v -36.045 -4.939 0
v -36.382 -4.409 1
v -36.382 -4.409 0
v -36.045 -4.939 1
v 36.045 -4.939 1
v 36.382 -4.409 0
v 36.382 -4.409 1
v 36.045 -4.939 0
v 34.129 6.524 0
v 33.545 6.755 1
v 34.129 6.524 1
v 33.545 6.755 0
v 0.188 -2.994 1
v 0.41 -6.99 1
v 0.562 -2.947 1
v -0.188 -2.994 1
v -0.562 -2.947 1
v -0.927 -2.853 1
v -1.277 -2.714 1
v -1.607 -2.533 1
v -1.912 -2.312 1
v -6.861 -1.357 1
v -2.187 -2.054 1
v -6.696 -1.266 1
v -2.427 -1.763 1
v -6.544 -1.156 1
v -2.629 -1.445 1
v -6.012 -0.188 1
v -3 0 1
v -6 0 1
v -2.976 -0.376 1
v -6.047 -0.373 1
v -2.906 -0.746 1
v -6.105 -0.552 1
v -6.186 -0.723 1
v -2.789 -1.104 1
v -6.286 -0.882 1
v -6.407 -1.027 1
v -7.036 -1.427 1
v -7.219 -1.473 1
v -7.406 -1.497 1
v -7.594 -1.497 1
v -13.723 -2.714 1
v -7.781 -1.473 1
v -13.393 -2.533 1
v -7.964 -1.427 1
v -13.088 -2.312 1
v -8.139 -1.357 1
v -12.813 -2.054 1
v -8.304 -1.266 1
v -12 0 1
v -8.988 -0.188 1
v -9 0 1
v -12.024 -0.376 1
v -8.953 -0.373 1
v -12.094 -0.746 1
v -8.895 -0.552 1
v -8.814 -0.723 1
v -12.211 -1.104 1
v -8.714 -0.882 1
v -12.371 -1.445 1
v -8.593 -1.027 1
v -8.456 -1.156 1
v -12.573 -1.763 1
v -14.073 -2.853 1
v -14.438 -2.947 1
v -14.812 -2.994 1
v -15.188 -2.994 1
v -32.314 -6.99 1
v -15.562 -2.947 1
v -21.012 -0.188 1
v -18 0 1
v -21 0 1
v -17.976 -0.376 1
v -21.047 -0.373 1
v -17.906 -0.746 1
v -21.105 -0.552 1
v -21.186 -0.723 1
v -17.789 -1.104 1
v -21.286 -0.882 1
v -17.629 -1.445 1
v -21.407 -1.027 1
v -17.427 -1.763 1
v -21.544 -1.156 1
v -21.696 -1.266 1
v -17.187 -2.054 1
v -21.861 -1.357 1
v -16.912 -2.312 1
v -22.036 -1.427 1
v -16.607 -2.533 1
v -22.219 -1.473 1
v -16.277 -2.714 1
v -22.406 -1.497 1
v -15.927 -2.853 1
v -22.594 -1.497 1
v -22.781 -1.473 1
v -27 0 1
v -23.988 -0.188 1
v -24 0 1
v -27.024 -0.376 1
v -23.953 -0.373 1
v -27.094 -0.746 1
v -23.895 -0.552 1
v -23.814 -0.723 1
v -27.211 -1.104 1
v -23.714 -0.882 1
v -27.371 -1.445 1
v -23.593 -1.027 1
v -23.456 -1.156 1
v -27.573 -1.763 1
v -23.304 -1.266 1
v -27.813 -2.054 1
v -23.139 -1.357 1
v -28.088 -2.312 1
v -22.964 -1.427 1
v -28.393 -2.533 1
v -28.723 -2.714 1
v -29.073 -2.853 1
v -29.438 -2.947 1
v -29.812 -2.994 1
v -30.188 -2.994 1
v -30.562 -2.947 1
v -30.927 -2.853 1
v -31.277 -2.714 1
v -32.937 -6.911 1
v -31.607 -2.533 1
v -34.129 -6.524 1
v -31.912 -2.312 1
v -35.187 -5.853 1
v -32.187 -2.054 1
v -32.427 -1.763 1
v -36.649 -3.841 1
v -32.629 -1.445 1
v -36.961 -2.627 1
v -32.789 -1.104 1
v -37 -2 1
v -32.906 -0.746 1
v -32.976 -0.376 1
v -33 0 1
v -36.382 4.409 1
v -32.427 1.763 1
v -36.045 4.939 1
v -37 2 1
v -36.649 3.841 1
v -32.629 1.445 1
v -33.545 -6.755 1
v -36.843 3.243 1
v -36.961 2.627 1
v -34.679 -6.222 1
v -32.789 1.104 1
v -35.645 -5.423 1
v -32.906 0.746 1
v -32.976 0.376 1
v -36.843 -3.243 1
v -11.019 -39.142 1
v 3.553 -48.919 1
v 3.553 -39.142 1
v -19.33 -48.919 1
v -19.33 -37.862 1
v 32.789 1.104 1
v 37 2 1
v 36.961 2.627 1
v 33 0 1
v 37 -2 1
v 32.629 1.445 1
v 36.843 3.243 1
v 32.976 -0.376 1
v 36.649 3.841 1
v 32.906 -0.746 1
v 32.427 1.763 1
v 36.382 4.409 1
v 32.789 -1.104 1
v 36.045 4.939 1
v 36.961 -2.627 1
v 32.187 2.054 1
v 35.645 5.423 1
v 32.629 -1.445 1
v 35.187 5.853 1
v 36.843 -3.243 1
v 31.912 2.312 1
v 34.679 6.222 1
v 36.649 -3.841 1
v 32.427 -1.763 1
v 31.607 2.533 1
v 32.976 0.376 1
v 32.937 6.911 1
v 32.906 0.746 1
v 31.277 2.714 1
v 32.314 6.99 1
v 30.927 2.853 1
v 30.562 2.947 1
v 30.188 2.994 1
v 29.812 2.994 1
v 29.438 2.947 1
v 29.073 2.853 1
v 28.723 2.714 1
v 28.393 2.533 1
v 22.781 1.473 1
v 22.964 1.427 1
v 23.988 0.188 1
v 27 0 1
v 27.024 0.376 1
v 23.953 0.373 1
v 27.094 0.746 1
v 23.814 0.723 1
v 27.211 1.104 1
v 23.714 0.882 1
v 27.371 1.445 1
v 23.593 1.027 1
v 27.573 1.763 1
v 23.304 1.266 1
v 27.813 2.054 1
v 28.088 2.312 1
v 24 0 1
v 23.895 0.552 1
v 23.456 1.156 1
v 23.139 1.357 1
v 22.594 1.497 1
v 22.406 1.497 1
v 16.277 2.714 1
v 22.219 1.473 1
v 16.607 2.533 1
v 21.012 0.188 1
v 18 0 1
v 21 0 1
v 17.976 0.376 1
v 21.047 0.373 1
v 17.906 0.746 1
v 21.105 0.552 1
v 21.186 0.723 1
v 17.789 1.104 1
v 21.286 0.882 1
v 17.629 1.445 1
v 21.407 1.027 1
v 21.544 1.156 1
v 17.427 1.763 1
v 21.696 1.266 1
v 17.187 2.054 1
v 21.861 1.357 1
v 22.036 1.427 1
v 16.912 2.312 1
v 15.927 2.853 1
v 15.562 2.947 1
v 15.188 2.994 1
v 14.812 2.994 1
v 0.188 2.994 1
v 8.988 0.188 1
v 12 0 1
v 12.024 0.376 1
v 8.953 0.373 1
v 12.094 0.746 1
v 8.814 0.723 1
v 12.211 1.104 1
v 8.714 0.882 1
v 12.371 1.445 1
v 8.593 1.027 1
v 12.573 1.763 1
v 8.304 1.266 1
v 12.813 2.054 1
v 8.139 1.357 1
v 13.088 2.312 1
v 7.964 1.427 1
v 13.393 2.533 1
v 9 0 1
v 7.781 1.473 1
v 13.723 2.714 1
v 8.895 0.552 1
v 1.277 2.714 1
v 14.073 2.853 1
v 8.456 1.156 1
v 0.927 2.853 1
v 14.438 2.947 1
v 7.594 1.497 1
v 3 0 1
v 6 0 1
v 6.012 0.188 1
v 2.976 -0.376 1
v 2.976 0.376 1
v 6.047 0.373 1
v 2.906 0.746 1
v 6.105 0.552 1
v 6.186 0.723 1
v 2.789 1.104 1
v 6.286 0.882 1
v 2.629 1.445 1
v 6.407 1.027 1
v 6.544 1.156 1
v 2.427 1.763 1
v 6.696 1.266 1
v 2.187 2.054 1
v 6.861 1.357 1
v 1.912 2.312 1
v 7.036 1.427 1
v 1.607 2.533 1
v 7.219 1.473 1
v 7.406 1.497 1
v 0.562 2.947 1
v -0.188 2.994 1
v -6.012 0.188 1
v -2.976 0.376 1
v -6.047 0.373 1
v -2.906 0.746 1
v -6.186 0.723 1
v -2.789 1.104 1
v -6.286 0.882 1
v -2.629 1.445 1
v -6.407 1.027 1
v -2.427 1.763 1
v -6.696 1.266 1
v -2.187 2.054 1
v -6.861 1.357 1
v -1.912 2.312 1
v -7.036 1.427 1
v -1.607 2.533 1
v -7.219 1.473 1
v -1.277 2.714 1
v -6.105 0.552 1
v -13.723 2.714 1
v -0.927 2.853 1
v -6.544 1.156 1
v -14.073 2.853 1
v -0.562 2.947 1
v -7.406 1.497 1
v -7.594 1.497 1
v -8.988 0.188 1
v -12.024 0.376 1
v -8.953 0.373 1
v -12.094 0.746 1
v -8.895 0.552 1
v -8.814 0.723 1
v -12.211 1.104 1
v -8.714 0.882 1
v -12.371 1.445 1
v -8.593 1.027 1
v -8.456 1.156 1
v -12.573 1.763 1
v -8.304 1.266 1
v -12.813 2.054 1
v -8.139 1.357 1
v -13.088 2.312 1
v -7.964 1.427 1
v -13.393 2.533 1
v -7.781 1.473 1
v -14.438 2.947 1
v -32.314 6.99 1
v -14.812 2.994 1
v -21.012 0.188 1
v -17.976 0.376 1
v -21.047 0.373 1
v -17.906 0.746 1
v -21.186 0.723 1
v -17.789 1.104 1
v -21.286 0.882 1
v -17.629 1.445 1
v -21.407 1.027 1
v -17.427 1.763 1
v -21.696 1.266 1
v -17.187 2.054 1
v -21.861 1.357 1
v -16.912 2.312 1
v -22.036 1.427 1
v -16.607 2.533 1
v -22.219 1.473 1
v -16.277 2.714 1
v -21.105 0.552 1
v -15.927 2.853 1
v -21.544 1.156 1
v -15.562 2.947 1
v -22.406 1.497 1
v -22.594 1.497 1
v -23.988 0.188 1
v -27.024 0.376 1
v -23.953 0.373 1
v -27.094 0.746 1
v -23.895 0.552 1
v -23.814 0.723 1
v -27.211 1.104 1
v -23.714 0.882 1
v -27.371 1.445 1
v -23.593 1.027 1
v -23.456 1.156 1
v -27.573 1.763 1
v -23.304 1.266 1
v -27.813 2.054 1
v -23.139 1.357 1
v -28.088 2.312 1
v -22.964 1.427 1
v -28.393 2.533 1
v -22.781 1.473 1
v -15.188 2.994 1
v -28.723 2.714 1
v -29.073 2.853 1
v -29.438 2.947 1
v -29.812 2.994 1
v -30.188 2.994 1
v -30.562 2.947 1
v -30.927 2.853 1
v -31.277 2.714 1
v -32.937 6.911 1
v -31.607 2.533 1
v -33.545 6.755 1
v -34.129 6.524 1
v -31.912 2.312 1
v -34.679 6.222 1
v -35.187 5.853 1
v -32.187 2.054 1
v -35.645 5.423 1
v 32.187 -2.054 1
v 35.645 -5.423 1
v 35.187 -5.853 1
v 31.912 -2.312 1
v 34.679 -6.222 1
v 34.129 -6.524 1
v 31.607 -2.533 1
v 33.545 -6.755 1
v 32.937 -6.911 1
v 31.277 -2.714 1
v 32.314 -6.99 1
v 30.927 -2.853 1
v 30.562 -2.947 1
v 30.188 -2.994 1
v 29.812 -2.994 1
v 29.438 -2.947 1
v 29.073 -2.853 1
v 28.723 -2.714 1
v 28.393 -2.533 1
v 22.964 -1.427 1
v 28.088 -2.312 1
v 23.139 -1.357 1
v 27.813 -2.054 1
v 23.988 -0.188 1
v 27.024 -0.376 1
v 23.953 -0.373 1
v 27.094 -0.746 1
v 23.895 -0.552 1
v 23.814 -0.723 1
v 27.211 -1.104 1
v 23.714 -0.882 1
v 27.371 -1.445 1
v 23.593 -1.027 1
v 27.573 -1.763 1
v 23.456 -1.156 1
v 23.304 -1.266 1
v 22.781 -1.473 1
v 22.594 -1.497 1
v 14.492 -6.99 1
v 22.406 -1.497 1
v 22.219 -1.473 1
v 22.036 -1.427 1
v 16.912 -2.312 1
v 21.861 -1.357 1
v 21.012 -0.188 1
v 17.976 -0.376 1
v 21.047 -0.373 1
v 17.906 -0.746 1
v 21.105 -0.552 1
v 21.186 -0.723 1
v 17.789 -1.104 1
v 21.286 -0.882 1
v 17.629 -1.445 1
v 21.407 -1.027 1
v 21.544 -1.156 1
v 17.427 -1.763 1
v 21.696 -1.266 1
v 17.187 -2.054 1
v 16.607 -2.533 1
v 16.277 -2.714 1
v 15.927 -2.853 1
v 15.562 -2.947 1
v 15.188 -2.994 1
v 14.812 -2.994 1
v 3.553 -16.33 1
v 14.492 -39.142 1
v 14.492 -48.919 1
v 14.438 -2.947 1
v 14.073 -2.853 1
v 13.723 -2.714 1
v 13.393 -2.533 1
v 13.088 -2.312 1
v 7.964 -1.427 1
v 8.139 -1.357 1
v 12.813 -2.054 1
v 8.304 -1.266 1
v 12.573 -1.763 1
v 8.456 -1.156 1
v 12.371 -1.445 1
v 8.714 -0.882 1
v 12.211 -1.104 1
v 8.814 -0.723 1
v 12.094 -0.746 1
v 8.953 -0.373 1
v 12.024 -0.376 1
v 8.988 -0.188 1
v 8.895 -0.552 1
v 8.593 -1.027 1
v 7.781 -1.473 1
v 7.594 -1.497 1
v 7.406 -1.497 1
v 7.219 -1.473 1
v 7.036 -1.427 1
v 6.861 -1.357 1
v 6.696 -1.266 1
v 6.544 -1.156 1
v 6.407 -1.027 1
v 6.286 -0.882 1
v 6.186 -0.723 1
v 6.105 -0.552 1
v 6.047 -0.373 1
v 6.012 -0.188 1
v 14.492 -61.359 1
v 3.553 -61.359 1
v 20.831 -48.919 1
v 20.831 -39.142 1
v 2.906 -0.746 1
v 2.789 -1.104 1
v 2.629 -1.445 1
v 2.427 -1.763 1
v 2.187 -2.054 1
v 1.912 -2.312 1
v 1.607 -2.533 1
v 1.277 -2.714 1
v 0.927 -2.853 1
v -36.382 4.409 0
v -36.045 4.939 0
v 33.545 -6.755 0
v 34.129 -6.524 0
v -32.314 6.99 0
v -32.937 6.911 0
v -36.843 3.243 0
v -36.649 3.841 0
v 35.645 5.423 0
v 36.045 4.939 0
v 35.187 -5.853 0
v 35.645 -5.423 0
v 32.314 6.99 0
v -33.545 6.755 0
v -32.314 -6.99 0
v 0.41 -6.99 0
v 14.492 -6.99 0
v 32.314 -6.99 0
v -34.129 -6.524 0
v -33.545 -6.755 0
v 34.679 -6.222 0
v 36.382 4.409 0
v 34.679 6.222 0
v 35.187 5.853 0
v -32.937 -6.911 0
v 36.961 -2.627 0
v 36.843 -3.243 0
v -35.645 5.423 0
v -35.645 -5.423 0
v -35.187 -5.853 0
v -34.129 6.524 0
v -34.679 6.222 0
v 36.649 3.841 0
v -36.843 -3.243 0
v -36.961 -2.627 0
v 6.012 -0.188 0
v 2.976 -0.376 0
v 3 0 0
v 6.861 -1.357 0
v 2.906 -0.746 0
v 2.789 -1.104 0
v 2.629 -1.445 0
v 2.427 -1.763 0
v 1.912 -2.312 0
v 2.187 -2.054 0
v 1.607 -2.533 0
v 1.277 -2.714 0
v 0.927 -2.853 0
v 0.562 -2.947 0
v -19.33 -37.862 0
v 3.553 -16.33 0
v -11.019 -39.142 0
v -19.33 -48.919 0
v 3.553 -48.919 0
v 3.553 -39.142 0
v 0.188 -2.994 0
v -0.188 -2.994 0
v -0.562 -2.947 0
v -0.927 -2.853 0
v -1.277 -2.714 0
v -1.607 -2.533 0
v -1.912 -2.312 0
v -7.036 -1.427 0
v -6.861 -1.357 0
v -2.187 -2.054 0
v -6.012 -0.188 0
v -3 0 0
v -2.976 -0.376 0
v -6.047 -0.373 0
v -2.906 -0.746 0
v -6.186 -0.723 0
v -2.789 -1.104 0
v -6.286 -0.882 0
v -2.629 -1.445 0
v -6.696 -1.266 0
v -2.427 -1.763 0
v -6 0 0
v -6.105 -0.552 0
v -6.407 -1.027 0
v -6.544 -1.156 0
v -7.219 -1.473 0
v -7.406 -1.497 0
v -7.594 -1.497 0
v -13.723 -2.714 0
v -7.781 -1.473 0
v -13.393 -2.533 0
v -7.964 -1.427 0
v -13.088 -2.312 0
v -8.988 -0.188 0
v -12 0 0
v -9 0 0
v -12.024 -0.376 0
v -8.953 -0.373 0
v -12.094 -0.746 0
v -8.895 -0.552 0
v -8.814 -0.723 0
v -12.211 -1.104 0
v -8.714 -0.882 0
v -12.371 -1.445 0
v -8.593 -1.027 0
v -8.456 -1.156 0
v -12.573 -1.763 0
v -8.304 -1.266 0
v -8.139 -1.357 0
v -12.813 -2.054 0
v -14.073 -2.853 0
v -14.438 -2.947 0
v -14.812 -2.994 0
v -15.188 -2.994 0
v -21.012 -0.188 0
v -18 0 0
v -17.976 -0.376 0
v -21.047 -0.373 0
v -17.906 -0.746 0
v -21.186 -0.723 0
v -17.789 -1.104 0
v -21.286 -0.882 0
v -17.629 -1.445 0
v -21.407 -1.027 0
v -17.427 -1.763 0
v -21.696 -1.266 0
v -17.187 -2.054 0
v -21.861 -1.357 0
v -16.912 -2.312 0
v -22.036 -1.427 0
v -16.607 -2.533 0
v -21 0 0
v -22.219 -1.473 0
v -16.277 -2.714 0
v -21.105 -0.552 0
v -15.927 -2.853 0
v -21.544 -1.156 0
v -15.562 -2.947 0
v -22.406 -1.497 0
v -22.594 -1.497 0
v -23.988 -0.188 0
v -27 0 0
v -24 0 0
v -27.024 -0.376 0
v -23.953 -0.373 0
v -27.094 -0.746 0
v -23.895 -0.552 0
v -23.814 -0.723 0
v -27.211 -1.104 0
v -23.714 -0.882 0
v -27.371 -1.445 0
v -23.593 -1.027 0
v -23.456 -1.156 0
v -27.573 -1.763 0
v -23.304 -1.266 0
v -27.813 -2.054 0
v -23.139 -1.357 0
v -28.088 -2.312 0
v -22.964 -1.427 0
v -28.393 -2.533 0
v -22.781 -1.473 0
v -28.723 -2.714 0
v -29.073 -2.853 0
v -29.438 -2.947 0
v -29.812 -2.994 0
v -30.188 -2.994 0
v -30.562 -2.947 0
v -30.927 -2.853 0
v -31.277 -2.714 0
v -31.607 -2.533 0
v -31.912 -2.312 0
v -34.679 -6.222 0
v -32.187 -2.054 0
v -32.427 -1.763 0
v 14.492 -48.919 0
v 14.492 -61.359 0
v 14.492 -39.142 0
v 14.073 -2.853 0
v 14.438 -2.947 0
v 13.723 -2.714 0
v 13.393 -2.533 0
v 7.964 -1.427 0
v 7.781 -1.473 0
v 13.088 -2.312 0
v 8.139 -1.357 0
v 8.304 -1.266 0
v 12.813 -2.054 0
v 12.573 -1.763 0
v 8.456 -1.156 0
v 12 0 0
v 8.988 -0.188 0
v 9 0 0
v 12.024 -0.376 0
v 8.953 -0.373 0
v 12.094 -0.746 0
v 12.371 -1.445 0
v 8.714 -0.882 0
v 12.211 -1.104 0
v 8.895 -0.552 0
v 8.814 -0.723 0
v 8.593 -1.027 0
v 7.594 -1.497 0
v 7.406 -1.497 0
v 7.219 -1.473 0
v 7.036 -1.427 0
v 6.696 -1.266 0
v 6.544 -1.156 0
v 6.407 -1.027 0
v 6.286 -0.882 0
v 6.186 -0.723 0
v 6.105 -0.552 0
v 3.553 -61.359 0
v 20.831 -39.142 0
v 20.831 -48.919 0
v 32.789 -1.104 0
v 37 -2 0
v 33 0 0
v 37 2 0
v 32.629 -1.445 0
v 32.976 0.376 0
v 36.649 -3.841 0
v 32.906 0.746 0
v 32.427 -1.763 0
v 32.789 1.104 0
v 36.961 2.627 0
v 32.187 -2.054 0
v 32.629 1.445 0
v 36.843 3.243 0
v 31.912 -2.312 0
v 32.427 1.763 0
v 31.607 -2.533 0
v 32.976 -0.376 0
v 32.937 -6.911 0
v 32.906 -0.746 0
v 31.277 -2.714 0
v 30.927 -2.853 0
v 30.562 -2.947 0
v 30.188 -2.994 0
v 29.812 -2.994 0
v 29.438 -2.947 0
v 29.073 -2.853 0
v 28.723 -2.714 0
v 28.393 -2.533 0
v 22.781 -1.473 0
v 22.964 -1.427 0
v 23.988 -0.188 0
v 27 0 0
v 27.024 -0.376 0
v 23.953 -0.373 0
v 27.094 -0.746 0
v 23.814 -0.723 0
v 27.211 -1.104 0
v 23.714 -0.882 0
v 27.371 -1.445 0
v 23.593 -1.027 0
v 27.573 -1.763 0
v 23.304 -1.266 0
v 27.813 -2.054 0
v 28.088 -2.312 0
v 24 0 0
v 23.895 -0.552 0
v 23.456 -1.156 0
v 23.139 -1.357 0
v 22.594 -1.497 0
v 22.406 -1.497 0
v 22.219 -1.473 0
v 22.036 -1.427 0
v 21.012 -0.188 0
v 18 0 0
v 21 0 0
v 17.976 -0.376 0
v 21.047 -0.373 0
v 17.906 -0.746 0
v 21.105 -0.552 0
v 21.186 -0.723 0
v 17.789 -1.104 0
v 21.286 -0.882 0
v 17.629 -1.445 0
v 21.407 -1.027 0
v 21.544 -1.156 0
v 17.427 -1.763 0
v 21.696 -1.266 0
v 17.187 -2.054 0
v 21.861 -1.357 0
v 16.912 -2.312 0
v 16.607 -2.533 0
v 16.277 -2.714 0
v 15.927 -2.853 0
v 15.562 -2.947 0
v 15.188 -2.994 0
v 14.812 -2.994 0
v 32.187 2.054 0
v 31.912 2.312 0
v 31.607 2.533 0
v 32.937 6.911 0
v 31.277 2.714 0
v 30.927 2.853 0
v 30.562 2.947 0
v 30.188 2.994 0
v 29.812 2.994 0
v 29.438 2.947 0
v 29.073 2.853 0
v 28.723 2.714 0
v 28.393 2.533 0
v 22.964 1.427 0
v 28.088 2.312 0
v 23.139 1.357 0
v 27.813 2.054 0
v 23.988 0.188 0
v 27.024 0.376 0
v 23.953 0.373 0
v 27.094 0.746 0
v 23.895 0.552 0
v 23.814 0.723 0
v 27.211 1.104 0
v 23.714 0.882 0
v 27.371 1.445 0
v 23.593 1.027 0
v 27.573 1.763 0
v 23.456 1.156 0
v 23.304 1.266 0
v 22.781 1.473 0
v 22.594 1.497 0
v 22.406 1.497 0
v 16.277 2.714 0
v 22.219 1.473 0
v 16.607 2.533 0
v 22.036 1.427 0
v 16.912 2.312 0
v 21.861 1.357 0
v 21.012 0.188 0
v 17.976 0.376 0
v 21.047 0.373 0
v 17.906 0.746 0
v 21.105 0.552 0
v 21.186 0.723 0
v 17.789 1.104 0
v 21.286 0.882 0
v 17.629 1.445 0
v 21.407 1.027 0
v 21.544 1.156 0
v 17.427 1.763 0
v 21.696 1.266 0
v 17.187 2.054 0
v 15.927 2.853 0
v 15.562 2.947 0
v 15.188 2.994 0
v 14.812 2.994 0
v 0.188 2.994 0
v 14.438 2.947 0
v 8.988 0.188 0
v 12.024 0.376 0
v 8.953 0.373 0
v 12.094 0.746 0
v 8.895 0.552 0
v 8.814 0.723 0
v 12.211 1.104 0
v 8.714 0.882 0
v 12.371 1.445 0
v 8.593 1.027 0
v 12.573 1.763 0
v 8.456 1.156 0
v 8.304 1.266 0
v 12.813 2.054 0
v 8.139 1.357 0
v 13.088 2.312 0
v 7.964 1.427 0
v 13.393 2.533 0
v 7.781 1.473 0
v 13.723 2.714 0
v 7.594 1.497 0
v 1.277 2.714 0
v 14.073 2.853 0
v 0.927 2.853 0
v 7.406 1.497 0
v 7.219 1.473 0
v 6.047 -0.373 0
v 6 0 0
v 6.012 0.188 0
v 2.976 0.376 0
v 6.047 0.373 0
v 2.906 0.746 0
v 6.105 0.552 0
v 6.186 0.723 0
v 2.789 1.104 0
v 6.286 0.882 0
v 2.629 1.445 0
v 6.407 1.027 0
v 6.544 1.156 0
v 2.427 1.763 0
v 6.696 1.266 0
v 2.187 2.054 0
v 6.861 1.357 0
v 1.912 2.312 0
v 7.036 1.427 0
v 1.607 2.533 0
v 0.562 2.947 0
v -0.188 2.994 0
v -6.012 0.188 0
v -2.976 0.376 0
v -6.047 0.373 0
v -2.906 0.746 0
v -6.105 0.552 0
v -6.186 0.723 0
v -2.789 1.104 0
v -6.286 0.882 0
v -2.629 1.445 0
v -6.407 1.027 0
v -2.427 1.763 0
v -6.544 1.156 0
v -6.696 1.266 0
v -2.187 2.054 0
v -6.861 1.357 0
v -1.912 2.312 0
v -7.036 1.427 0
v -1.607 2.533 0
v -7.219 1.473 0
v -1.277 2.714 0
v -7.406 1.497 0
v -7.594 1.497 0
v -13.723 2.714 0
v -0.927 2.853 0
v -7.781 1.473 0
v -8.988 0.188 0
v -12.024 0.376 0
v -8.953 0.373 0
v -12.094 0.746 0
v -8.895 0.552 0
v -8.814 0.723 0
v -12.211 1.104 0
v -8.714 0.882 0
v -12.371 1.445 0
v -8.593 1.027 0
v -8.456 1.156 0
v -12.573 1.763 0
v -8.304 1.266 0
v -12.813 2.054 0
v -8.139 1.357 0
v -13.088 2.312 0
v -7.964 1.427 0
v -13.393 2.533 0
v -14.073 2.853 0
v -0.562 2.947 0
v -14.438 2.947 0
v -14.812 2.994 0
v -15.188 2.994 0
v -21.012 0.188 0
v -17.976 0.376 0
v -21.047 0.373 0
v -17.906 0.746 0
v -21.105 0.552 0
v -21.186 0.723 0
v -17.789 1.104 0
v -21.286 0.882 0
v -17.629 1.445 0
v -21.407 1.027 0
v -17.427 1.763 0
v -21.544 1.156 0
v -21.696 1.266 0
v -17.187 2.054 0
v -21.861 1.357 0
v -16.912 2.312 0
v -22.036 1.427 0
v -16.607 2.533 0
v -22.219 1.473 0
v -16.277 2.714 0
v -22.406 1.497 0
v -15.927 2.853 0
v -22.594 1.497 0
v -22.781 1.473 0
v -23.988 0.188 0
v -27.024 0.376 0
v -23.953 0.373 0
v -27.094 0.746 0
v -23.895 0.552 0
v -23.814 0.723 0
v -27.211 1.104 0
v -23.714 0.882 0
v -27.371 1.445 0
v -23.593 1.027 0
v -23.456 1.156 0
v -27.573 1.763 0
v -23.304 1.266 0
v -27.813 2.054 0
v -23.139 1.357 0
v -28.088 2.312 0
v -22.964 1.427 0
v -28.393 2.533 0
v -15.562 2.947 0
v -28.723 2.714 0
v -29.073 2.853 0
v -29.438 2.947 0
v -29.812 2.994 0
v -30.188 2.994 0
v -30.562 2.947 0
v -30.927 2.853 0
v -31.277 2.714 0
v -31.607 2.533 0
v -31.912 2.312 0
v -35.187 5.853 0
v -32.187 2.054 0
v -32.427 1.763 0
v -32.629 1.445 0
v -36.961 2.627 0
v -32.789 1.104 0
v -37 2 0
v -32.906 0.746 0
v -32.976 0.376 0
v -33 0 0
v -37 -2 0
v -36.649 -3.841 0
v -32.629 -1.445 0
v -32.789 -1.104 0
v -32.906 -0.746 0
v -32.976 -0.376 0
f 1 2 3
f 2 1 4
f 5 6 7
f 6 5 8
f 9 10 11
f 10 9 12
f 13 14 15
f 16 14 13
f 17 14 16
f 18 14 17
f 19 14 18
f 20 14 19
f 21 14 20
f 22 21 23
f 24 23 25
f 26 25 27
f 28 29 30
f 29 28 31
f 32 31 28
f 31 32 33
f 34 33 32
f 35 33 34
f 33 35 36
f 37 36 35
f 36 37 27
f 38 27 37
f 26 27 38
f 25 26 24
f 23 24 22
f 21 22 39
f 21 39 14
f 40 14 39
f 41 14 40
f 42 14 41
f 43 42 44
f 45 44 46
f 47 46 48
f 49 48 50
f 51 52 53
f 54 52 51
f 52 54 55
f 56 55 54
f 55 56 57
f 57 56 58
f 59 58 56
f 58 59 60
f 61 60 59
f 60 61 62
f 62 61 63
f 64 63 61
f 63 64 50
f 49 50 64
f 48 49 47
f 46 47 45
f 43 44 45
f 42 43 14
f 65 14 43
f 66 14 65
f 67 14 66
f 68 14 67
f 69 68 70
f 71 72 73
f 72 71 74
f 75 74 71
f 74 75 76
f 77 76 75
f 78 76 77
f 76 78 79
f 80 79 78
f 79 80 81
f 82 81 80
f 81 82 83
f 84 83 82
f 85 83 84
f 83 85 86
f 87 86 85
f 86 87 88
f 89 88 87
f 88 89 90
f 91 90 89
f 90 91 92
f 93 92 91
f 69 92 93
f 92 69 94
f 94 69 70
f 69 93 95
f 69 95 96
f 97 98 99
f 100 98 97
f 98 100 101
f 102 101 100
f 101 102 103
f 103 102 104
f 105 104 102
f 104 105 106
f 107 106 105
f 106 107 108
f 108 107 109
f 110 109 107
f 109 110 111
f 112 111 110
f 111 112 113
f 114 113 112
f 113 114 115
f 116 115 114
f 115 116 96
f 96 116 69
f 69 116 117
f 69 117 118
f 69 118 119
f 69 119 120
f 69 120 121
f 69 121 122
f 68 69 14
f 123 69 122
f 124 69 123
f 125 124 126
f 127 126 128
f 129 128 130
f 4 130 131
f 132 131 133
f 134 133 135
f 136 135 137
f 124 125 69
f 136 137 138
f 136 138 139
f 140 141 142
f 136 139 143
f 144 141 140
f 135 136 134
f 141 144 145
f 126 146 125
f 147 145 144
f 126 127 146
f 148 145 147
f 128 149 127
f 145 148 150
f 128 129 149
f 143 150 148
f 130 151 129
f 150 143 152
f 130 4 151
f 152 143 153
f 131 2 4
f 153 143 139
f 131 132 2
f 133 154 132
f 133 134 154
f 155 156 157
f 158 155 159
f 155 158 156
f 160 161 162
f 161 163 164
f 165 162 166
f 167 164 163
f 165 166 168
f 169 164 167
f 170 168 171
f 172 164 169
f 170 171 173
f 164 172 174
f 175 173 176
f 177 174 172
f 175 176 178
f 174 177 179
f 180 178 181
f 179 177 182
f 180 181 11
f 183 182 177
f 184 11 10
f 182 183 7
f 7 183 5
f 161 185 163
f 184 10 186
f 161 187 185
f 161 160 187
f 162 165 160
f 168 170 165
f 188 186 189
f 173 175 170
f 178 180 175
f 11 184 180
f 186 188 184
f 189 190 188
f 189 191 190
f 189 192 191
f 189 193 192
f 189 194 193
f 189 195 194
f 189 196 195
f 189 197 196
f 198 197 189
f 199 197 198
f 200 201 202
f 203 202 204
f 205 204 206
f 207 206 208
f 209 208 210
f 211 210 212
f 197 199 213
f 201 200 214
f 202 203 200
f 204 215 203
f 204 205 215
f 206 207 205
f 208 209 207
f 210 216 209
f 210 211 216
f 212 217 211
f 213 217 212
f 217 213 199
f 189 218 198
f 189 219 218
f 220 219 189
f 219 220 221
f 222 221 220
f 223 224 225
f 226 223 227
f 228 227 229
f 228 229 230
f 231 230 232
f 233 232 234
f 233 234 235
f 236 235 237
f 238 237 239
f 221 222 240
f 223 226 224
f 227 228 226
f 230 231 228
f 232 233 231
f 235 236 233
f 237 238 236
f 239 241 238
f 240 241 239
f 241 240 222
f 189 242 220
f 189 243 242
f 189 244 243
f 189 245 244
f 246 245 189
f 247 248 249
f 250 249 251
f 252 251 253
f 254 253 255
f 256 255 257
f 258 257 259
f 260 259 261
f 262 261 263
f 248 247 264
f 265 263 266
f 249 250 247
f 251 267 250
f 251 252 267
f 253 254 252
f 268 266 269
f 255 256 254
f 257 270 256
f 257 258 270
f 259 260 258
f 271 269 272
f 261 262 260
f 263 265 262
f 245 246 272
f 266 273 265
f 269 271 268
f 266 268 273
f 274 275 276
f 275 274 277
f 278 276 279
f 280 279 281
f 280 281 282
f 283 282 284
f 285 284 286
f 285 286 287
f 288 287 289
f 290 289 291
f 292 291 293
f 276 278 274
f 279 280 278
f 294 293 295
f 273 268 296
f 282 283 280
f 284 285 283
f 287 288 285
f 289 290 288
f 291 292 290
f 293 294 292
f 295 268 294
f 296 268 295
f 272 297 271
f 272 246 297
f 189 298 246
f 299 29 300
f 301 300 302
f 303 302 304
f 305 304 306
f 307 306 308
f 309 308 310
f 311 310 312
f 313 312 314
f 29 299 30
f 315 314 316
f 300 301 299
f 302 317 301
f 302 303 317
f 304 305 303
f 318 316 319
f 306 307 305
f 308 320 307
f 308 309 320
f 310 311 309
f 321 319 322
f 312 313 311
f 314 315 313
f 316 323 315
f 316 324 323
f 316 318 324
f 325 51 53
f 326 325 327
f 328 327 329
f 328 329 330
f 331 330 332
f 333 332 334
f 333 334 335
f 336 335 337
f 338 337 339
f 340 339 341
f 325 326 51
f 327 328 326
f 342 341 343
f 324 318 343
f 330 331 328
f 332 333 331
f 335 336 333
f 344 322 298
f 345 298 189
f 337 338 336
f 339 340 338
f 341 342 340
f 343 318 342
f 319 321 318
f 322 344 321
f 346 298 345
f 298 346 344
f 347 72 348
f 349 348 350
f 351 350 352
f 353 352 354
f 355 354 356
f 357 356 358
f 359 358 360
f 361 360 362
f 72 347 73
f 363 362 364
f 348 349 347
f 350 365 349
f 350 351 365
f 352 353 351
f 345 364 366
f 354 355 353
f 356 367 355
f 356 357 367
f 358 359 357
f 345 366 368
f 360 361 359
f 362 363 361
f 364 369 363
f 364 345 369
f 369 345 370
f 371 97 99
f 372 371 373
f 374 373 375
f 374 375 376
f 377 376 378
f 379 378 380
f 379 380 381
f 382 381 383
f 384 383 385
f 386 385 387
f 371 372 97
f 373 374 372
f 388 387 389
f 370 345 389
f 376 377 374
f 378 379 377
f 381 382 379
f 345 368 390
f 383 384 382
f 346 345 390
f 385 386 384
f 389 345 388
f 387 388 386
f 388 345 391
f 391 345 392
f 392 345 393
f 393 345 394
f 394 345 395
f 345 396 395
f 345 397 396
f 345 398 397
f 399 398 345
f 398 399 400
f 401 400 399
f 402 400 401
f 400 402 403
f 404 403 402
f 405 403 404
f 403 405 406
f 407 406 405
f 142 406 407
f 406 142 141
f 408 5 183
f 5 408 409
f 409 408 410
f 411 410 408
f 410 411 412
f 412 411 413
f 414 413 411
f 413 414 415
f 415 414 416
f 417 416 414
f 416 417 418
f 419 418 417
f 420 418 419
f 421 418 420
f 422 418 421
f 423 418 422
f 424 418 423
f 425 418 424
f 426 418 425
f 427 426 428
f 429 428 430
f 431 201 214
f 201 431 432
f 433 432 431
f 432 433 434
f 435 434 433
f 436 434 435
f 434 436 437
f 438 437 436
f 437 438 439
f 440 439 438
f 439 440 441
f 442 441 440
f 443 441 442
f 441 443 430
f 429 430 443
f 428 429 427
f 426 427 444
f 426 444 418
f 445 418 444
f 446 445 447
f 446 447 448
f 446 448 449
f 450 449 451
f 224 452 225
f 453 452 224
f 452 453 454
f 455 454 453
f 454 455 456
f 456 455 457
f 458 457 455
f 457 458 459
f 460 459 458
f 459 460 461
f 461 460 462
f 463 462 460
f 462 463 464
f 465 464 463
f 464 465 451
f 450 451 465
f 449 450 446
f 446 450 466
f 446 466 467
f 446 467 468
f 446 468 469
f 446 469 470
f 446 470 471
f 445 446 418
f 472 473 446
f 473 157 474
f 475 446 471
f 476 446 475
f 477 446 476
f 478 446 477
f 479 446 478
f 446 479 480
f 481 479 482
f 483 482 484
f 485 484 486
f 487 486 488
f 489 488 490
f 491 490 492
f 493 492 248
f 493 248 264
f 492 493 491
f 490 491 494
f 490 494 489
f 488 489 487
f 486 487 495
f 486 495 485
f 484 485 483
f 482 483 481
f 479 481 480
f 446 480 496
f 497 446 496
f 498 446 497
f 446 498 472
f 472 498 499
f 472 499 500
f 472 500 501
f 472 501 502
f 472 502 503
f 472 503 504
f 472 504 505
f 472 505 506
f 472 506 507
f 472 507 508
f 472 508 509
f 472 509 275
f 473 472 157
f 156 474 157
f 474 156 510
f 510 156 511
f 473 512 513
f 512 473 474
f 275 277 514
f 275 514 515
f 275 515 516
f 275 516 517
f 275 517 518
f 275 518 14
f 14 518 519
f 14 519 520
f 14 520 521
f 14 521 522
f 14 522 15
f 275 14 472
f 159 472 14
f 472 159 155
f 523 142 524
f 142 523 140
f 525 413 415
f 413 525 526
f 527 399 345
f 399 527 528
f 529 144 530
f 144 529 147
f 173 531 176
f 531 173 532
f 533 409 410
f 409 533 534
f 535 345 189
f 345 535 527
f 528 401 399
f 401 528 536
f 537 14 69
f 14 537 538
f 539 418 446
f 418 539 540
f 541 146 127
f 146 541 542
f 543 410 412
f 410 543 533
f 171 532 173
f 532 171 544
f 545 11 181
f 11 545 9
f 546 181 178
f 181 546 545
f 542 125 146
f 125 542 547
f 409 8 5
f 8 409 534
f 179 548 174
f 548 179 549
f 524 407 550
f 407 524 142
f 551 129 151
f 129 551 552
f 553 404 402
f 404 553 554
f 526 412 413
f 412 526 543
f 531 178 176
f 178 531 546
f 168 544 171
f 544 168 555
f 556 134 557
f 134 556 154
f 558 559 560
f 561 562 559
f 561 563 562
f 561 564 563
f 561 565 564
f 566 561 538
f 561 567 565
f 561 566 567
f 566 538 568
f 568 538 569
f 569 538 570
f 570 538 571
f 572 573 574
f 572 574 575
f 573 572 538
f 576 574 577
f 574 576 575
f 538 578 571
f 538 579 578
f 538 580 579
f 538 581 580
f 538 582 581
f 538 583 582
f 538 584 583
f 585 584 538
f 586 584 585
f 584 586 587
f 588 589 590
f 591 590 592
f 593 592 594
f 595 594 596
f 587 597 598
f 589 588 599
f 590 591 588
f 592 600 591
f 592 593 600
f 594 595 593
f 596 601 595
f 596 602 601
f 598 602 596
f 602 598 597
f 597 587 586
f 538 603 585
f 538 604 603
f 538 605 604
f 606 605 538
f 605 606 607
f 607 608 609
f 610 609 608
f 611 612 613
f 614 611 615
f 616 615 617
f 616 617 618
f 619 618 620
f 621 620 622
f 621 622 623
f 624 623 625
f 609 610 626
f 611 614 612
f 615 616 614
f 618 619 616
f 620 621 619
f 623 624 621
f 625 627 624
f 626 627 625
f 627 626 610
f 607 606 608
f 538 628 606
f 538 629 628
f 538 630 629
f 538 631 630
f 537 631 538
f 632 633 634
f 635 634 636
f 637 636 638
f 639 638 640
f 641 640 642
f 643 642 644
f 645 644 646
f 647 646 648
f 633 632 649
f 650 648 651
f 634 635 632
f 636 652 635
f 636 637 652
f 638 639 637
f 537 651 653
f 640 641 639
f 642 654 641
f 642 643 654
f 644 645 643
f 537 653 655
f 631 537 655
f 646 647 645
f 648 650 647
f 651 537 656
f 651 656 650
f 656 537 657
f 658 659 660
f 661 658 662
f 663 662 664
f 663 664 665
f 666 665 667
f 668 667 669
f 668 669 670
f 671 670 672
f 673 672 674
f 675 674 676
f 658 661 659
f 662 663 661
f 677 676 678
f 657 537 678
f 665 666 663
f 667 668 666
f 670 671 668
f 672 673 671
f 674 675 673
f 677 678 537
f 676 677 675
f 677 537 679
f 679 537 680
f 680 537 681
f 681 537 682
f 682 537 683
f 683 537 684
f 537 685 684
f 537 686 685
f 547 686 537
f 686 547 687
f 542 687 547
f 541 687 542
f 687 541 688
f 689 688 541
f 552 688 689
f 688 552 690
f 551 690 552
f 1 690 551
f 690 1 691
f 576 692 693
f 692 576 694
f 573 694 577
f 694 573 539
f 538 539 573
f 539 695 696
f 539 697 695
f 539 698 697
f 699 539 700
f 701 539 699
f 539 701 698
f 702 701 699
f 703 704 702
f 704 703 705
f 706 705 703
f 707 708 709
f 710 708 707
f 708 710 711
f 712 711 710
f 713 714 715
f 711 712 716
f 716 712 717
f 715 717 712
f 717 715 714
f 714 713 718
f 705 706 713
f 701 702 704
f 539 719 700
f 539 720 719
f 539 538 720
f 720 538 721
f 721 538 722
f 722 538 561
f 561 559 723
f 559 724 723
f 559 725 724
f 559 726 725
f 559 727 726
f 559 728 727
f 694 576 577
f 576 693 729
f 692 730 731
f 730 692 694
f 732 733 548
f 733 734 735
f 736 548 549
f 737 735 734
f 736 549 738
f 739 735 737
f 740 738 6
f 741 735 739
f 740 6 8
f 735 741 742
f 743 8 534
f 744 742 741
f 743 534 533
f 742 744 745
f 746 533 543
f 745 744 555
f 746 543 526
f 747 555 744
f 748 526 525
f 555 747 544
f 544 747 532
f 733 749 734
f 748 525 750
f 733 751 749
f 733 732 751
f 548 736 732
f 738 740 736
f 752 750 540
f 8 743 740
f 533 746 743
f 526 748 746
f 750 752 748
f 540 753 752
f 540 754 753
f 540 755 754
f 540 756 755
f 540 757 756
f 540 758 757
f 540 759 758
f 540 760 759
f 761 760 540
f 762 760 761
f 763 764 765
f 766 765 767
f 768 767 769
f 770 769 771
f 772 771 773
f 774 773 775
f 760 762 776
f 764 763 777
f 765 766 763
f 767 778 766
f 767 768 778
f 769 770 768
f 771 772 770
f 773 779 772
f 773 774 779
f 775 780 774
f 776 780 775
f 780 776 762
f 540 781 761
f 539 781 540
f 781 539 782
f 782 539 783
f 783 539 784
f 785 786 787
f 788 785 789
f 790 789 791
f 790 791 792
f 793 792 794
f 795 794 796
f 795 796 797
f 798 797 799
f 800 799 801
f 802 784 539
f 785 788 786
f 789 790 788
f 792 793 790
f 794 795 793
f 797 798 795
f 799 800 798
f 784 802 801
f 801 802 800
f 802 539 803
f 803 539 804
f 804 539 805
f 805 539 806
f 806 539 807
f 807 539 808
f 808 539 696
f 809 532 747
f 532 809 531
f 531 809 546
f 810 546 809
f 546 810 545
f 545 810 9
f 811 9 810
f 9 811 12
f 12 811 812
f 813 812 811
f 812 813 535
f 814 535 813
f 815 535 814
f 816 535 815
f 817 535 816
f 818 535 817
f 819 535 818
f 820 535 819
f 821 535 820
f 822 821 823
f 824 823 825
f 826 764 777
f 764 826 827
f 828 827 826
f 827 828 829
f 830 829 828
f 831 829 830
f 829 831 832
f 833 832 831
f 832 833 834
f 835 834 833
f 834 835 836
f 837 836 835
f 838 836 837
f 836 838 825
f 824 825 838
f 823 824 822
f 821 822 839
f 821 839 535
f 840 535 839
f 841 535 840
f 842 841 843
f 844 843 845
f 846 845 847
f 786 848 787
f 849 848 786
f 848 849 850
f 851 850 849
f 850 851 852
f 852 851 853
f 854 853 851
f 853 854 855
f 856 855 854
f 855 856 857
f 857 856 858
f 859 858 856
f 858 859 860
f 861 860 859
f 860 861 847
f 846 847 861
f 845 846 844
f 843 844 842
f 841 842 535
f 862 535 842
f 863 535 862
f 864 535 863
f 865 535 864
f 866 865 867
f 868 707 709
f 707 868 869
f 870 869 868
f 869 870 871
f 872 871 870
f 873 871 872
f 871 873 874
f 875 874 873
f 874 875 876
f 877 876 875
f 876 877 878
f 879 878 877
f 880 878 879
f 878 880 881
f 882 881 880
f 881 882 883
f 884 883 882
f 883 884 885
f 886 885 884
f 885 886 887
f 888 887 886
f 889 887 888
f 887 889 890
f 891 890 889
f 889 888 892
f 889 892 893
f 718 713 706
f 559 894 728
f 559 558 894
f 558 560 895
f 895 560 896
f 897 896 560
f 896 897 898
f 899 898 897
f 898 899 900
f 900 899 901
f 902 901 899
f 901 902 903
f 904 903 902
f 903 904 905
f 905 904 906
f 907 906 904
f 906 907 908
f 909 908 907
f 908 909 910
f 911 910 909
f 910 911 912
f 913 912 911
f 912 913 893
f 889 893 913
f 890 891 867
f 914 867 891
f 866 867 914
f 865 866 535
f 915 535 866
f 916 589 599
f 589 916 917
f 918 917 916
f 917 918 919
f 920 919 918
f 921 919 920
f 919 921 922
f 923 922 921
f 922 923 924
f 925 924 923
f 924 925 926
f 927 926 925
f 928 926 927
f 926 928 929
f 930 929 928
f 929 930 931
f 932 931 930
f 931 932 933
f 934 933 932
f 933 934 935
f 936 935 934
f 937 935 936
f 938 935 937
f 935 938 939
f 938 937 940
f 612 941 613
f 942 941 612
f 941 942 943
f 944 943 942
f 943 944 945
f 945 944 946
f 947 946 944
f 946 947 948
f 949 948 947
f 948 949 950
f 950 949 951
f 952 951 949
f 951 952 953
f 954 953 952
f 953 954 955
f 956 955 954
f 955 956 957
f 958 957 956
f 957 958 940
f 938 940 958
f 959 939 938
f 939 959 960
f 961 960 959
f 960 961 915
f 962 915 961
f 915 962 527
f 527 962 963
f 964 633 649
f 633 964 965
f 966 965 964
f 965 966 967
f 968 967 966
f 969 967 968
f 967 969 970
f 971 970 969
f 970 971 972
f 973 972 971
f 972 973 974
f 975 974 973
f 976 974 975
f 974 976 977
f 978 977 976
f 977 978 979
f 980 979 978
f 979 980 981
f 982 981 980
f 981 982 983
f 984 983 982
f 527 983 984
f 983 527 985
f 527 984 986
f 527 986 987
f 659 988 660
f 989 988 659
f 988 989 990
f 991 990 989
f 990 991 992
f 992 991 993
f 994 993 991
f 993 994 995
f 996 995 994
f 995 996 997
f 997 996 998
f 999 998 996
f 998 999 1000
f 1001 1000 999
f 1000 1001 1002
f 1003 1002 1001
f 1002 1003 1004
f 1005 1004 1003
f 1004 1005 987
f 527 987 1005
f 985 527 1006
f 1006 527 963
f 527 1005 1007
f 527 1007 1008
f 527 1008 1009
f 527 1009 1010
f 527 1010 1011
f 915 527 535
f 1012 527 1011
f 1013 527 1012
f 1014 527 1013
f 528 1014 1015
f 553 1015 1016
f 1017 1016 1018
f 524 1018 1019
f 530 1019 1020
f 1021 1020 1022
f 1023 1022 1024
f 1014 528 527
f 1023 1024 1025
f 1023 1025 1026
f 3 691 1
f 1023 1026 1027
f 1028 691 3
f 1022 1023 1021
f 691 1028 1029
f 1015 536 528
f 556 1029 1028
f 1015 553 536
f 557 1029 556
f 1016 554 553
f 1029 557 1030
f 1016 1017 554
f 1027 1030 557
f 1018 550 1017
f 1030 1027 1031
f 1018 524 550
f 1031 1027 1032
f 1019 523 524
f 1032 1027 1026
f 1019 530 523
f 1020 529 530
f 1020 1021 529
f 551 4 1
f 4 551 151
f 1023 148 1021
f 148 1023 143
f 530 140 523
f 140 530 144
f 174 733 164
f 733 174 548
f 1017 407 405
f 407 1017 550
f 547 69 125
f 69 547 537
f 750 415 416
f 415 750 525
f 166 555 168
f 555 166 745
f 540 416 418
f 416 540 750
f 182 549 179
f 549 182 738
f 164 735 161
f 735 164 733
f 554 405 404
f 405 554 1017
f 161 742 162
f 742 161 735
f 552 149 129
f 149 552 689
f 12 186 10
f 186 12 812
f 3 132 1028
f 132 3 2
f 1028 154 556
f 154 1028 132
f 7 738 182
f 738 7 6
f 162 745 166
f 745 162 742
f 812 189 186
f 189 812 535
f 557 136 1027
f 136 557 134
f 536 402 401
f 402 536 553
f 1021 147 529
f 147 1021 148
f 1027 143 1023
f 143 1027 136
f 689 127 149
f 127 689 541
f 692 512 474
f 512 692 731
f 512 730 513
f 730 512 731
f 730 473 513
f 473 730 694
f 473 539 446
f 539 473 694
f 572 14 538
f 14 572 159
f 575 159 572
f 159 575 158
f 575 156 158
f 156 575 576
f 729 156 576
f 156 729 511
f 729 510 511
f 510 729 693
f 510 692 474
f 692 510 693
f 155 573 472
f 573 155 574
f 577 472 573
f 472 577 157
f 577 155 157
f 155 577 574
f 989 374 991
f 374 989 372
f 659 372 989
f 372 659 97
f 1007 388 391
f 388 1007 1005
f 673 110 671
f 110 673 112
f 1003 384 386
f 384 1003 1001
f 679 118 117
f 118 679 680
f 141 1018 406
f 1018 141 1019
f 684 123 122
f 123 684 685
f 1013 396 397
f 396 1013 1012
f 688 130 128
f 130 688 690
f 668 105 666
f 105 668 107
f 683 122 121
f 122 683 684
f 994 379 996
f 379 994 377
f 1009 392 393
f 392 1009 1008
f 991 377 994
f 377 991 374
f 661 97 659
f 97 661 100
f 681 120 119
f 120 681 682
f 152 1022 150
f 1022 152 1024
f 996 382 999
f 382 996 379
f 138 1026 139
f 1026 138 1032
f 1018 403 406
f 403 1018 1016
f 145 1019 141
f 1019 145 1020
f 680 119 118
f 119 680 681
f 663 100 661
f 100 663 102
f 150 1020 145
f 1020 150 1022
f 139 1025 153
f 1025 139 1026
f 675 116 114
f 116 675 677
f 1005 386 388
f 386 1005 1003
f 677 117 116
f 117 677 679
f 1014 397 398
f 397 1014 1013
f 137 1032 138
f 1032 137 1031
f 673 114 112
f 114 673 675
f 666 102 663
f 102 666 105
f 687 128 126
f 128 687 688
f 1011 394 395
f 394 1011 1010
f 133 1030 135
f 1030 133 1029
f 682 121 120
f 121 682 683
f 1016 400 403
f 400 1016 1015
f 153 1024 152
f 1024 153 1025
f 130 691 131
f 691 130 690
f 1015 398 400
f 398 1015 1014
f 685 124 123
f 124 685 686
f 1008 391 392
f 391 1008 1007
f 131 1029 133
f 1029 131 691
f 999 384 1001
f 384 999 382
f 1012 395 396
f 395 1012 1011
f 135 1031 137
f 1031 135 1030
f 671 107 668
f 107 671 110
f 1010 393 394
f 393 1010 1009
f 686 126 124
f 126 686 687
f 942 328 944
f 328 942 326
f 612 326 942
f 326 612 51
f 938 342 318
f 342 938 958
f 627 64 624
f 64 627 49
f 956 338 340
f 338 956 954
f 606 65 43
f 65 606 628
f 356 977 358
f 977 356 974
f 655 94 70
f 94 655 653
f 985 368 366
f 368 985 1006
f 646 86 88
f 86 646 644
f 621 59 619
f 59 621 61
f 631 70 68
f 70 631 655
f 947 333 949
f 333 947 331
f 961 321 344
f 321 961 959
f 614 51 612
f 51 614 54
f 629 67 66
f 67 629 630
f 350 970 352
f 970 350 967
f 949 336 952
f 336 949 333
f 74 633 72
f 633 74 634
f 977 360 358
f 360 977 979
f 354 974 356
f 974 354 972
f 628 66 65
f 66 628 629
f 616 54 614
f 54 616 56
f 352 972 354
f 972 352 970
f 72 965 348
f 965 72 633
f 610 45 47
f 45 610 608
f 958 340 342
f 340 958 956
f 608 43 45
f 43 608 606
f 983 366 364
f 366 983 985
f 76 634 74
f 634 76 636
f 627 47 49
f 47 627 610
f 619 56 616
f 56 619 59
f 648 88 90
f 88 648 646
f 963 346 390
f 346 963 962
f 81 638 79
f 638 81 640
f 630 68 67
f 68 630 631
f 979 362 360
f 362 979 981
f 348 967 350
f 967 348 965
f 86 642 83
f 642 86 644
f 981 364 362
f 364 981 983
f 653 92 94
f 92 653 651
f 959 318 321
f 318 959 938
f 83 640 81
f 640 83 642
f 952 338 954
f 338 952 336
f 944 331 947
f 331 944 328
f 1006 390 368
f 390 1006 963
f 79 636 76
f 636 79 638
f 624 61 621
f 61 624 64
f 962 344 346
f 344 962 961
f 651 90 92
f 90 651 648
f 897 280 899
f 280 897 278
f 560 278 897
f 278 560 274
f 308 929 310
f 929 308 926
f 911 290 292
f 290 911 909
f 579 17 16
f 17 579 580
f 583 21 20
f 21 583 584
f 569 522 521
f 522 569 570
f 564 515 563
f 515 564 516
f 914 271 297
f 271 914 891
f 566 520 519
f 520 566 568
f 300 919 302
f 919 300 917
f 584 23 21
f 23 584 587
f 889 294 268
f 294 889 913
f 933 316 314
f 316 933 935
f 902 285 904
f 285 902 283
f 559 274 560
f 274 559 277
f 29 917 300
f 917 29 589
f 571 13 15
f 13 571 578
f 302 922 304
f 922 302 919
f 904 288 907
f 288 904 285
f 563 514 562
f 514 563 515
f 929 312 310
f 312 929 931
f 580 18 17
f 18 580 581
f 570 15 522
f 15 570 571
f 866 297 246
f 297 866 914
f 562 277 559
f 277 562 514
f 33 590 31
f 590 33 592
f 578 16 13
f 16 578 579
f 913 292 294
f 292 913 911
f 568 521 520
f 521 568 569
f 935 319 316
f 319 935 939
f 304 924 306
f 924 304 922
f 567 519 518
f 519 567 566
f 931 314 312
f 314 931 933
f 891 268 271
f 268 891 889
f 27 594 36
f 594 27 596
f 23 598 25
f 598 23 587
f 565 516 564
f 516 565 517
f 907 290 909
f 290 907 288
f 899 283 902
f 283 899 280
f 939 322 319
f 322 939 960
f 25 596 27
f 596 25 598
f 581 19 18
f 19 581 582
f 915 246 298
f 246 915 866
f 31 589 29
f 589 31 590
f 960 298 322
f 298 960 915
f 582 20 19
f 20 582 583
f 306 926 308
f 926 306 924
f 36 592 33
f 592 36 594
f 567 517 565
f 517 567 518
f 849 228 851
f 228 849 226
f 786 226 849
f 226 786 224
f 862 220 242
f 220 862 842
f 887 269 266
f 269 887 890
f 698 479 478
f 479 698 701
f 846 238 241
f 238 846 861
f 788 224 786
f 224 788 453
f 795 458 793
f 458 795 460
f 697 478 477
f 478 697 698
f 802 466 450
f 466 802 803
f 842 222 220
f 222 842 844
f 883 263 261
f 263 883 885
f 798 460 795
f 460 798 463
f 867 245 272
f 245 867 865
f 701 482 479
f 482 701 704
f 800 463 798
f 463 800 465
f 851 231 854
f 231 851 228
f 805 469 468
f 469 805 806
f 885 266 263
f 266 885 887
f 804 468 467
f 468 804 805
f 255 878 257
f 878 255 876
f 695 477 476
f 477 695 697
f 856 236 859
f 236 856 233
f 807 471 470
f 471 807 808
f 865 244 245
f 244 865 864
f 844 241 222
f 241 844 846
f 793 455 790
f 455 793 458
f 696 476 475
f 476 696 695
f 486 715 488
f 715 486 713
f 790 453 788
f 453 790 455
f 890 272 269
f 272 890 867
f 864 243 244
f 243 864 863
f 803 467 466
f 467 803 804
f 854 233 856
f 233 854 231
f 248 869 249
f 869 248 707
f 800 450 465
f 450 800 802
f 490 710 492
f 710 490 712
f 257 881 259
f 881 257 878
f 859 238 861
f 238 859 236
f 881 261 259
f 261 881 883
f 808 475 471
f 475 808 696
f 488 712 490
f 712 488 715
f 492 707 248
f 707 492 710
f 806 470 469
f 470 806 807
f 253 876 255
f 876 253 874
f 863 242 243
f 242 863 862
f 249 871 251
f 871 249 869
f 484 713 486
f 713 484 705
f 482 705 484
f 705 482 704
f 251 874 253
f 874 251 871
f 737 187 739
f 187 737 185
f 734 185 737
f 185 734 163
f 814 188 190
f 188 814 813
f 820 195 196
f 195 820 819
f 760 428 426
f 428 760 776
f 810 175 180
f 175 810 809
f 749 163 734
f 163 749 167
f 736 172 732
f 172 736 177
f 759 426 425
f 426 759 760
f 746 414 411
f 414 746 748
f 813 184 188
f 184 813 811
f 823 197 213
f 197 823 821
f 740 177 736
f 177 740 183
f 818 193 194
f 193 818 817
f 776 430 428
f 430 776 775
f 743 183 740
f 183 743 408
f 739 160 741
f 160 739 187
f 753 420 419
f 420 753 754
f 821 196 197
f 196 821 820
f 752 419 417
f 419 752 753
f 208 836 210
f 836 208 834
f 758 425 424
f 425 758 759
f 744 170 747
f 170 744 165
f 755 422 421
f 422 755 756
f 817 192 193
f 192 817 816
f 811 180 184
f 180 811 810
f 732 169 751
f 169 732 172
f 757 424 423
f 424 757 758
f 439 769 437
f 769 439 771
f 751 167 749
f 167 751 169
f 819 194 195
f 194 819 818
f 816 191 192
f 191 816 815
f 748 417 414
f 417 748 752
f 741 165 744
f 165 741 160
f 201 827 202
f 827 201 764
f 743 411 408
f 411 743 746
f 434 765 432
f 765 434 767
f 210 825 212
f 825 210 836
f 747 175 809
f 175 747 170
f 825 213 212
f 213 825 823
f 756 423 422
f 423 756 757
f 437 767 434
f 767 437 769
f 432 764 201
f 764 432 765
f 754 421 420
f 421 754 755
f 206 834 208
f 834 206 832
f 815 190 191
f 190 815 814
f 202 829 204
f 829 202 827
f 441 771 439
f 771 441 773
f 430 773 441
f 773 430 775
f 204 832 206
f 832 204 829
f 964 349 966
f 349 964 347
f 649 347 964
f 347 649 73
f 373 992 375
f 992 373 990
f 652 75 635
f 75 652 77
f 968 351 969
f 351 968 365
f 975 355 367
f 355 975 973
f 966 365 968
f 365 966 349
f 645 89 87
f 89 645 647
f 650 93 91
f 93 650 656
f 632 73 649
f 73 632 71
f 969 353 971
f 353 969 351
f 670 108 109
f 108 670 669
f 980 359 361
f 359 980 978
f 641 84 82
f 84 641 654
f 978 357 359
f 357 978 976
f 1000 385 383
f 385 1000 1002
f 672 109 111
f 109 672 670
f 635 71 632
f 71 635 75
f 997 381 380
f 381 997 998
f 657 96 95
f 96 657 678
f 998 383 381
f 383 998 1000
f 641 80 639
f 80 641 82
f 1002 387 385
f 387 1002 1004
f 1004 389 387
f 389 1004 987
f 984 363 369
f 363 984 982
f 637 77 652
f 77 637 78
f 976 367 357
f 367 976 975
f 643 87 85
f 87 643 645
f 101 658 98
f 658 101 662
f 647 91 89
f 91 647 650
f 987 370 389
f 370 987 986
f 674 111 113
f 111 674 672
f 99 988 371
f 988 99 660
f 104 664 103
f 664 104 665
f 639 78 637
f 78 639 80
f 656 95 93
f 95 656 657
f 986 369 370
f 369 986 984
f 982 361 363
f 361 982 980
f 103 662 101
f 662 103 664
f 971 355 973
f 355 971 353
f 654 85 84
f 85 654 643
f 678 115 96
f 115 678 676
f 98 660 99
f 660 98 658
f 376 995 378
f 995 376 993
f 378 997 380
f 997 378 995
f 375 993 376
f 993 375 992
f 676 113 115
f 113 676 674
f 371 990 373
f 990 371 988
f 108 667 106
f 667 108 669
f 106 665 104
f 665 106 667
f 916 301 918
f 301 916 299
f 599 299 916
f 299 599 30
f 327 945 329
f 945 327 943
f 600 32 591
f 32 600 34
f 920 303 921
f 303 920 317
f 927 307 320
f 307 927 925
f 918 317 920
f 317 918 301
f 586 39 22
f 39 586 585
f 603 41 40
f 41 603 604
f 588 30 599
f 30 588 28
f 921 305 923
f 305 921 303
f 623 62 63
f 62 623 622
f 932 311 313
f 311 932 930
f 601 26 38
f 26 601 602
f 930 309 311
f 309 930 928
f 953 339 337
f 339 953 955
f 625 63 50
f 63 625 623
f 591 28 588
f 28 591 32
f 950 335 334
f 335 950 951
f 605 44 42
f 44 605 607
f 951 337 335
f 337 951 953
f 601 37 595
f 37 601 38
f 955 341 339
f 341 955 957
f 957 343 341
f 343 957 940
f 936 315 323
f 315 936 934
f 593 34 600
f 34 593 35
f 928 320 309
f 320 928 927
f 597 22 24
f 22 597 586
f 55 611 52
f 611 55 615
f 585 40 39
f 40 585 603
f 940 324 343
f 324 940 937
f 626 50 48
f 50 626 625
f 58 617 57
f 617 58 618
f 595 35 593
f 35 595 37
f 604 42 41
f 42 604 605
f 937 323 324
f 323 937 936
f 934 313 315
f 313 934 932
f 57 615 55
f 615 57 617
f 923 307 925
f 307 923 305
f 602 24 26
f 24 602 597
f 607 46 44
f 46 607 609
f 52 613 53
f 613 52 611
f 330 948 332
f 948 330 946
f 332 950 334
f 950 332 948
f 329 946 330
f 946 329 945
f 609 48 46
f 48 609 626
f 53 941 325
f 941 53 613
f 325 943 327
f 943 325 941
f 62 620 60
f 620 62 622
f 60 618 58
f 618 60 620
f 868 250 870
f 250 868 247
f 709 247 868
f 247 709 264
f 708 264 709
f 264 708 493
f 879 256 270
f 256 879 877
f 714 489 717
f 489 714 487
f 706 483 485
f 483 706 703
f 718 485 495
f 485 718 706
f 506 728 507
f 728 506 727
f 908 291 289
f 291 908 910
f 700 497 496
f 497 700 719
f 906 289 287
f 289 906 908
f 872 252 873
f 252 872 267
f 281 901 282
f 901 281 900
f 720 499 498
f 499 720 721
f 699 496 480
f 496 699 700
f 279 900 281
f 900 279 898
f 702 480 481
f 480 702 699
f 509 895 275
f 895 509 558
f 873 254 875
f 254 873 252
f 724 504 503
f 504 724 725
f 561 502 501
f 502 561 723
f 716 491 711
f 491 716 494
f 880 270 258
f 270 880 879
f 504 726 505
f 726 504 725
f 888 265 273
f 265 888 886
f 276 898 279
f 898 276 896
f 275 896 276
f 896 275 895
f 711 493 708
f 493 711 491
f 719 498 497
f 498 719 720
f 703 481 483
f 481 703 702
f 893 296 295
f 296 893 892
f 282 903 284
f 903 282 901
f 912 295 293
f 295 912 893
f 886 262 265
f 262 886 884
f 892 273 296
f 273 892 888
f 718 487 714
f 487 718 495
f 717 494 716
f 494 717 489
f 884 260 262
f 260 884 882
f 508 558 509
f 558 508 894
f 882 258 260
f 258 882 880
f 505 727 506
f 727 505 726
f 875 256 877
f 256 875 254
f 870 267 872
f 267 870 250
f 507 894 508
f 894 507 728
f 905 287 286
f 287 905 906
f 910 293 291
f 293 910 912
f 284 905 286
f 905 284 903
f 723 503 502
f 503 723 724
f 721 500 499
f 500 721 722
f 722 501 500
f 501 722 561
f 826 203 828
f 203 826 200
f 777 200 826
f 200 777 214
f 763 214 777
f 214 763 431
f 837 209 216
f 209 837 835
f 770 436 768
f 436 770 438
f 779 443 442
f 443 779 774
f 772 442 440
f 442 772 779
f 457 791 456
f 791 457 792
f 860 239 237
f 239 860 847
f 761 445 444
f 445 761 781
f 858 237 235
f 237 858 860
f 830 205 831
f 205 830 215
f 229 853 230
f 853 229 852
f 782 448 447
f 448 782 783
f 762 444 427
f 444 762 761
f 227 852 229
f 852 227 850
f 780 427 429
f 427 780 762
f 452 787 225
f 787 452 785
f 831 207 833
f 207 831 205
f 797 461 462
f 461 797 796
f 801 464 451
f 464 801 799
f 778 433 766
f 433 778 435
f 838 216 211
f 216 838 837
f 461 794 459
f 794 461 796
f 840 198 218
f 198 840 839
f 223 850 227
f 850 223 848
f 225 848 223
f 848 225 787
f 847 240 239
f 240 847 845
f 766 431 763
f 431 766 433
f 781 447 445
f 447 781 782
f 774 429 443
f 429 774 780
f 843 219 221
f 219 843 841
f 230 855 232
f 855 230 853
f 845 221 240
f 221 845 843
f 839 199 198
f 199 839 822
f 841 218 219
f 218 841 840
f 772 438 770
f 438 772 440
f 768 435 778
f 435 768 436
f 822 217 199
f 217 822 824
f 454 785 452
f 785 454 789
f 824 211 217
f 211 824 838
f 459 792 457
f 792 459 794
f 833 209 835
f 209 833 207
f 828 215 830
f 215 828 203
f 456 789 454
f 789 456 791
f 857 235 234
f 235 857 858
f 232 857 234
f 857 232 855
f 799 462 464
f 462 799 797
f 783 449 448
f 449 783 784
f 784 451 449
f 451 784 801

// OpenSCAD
$fn = 50;


difference() {
	union() {
		hull() {
			translate(v = [-32.0000000000, 2.0000000000, 0]) {
				cylinder(h = 1, r = 5);
			}
			translate(v = [32.0000000000, 2.0000000000, 0]) {
				cylinder(h = 1, r = 5);
			}
			translate(v = [-32.0000000000, -2.0000000000, 0]) {
				cylinder(h = 1, r = 5);
			}
			translate(v = [32.0000000000, -2.0000000000, 0]) {
				cylinder(h = 1, r = 5);
			}
		}
		translate(v = [0, -5, 0]) {
			linear_extrude(height = 1) {
				text(font = "DejaVu Sans Mono:style=Bold", halign = "center", size = 57.0000000000, text = "4", valign = "top");
			}
		}
	}
	union() {
		translate(v = [-30.0000000000, 0.0000000000, 0]) {
			translate(v = [0, 0, -100]) {
				cylinder(h = 200, r = 3.0000000000);
			}
		}
		translate(v = [-15.0000000000, 0.0000000000, 0]) {
			translate(v = [0, 0, -100]) {
				cylinder(h = 200, r = 3.0000000000);
			}
		}
		translate(v = [0, 0, -100]) {
			cylinder(h = 200, r = 3.0000000000);
		}
		translate(v = [15.0000000000, 0.0000000000, 0]) {
			translate(v = [0, 0, -100]) {
				cylinder(h = 200, r = 3.0000000000);
			}
		}
		translate(v = [30.0000000000, 0.0000000000, 0]) {
			translate(v = [0, 0, -100]) {
				cylinder(h = 200, r = 3.0000000000);
			}
		}
		translate(v = [-30.0000000000, 0.0000000000, 0]) {
			translate(v = [0, 0, -100]) {
				cylinder(h = 200, r = 1.5000000000);
			}
		}
		translate(v = [-22.5000000000, 0.0000000000, 0]) {
			translate(v = [0, 0, -100]) {
				cylinder(h = 200, r = 1.5000000000);
			}
		}
		translate(v = [-15.0000000000, 0.0000000000, 0]) {
			translate(v = [0, 0, -100]) {
				cylinder(h = 200, r = 1.5000000000);
			}
		}
		translate(v = [-7.5000000000, 0.0000000000, 0]) {
			translate(v = [0, 0, -100]) {
				cylinder(h = 200, r = 1.5000000000);
			}
		}
		translate(v = [0, 0, -100]) {
			cylinder(h = 200, r = 1.5000000000);
		}
		translate(v = [7.5000000000, 0.0000000000, 0]) {
			translate(v = [0, 0, -100]) {
				cylinder(h = 200, r = 1.5000000000);
			}
		}
		translate(v = [15.0000000000, 0.0000000000, 0]) {
			translate(v = [0, 0, -100]) {
				cylinder(h = 200, r = 1.5000000000);
			}
		}
		translate(v = [22.5000000000, 0.0000000000, 0]) {
			translate(v = [0, 0, -100]) {
				cylinder(h = 200, r = 1.5000000000);
			}
		}
		translate(v = [30.0000000000, 0.0000000000, 0]) {
			translate(v = [0, 0, -100]) {
				cylinder(h = 200, r = 1.5000000000);
			}
		}
	}
}
